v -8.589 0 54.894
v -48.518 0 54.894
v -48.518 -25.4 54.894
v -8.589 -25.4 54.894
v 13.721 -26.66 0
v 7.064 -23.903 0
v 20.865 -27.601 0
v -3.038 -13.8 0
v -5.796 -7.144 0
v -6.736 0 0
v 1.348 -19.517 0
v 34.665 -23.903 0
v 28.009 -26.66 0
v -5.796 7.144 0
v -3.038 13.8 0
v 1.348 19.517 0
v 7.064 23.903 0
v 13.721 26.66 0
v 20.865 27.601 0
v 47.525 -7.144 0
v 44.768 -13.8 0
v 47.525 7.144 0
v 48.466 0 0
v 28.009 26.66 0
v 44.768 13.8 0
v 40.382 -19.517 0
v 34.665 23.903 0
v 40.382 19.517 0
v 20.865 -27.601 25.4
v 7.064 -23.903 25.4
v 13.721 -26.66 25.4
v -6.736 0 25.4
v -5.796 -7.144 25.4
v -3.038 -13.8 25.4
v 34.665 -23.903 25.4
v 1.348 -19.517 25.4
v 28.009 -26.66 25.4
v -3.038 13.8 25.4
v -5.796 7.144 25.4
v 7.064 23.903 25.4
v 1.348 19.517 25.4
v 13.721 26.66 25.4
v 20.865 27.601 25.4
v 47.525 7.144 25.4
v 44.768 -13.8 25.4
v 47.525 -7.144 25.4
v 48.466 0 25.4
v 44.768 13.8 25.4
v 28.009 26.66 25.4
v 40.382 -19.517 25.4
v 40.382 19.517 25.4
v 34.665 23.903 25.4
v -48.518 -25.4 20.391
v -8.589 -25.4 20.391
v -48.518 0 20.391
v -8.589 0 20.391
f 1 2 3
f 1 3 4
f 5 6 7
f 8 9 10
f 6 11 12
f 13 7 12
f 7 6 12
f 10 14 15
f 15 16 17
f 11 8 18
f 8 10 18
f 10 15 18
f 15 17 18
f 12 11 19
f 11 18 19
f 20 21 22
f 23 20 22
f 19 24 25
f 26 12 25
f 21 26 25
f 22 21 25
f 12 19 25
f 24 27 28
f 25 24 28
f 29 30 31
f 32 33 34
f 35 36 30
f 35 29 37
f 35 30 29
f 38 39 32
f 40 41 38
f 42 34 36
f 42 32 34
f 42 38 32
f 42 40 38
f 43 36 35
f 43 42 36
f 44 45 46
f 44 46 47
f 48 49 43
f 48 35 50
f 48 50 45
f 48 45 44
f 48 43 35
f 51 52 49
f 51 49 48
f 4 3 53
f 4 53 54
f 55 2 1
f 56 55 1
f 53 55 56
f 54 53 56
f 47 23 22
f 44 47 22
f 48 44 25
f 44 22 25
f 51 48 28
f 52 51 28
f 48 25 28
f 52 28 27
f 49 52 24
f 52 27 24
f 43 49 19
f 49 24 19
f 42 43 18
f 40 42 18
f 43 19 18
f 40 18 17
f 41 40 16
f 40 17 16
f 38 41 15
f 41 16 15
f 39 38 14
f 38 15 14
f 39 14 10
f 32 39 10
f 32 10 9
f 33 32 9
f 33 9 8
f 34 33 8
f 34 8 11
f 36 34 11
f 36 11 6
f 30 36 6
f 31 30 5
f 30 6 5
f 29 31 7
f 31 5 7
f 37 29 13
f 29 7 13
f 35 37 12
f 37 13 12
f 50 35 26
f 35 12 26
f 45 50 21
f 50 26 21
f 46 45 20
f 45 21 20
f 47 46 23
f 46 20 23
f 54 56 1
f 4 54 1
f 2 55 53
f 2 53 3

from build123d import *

# Parameters (mm, degrees)
F0_W     = 39.929242
F0_H     = 34.502959
F1_DEPTH = 25.4
F2_R     = 27.60092
F3_DEPTH = 25.4


with BuildPart() as f1:
    # F0 (on Front) → F1 (new body)
    with BuildSketch(Plane.XZ):
        with Locations((-28.553612, 37.642122)):
            Rectangle(F0_W, F0_H)
    extrude(amount=F1_DEPTH)


with BuildPart() as f3:
    # F2 (on Top) → F3 (new body)
    with BuildSketch(Plane.XY):
        with Locations((20.864921, 0)):
            Circle(F2_R)
    extrude(amount=F3_DEPTH)


solid = Compound([f1.part, f3.part])
